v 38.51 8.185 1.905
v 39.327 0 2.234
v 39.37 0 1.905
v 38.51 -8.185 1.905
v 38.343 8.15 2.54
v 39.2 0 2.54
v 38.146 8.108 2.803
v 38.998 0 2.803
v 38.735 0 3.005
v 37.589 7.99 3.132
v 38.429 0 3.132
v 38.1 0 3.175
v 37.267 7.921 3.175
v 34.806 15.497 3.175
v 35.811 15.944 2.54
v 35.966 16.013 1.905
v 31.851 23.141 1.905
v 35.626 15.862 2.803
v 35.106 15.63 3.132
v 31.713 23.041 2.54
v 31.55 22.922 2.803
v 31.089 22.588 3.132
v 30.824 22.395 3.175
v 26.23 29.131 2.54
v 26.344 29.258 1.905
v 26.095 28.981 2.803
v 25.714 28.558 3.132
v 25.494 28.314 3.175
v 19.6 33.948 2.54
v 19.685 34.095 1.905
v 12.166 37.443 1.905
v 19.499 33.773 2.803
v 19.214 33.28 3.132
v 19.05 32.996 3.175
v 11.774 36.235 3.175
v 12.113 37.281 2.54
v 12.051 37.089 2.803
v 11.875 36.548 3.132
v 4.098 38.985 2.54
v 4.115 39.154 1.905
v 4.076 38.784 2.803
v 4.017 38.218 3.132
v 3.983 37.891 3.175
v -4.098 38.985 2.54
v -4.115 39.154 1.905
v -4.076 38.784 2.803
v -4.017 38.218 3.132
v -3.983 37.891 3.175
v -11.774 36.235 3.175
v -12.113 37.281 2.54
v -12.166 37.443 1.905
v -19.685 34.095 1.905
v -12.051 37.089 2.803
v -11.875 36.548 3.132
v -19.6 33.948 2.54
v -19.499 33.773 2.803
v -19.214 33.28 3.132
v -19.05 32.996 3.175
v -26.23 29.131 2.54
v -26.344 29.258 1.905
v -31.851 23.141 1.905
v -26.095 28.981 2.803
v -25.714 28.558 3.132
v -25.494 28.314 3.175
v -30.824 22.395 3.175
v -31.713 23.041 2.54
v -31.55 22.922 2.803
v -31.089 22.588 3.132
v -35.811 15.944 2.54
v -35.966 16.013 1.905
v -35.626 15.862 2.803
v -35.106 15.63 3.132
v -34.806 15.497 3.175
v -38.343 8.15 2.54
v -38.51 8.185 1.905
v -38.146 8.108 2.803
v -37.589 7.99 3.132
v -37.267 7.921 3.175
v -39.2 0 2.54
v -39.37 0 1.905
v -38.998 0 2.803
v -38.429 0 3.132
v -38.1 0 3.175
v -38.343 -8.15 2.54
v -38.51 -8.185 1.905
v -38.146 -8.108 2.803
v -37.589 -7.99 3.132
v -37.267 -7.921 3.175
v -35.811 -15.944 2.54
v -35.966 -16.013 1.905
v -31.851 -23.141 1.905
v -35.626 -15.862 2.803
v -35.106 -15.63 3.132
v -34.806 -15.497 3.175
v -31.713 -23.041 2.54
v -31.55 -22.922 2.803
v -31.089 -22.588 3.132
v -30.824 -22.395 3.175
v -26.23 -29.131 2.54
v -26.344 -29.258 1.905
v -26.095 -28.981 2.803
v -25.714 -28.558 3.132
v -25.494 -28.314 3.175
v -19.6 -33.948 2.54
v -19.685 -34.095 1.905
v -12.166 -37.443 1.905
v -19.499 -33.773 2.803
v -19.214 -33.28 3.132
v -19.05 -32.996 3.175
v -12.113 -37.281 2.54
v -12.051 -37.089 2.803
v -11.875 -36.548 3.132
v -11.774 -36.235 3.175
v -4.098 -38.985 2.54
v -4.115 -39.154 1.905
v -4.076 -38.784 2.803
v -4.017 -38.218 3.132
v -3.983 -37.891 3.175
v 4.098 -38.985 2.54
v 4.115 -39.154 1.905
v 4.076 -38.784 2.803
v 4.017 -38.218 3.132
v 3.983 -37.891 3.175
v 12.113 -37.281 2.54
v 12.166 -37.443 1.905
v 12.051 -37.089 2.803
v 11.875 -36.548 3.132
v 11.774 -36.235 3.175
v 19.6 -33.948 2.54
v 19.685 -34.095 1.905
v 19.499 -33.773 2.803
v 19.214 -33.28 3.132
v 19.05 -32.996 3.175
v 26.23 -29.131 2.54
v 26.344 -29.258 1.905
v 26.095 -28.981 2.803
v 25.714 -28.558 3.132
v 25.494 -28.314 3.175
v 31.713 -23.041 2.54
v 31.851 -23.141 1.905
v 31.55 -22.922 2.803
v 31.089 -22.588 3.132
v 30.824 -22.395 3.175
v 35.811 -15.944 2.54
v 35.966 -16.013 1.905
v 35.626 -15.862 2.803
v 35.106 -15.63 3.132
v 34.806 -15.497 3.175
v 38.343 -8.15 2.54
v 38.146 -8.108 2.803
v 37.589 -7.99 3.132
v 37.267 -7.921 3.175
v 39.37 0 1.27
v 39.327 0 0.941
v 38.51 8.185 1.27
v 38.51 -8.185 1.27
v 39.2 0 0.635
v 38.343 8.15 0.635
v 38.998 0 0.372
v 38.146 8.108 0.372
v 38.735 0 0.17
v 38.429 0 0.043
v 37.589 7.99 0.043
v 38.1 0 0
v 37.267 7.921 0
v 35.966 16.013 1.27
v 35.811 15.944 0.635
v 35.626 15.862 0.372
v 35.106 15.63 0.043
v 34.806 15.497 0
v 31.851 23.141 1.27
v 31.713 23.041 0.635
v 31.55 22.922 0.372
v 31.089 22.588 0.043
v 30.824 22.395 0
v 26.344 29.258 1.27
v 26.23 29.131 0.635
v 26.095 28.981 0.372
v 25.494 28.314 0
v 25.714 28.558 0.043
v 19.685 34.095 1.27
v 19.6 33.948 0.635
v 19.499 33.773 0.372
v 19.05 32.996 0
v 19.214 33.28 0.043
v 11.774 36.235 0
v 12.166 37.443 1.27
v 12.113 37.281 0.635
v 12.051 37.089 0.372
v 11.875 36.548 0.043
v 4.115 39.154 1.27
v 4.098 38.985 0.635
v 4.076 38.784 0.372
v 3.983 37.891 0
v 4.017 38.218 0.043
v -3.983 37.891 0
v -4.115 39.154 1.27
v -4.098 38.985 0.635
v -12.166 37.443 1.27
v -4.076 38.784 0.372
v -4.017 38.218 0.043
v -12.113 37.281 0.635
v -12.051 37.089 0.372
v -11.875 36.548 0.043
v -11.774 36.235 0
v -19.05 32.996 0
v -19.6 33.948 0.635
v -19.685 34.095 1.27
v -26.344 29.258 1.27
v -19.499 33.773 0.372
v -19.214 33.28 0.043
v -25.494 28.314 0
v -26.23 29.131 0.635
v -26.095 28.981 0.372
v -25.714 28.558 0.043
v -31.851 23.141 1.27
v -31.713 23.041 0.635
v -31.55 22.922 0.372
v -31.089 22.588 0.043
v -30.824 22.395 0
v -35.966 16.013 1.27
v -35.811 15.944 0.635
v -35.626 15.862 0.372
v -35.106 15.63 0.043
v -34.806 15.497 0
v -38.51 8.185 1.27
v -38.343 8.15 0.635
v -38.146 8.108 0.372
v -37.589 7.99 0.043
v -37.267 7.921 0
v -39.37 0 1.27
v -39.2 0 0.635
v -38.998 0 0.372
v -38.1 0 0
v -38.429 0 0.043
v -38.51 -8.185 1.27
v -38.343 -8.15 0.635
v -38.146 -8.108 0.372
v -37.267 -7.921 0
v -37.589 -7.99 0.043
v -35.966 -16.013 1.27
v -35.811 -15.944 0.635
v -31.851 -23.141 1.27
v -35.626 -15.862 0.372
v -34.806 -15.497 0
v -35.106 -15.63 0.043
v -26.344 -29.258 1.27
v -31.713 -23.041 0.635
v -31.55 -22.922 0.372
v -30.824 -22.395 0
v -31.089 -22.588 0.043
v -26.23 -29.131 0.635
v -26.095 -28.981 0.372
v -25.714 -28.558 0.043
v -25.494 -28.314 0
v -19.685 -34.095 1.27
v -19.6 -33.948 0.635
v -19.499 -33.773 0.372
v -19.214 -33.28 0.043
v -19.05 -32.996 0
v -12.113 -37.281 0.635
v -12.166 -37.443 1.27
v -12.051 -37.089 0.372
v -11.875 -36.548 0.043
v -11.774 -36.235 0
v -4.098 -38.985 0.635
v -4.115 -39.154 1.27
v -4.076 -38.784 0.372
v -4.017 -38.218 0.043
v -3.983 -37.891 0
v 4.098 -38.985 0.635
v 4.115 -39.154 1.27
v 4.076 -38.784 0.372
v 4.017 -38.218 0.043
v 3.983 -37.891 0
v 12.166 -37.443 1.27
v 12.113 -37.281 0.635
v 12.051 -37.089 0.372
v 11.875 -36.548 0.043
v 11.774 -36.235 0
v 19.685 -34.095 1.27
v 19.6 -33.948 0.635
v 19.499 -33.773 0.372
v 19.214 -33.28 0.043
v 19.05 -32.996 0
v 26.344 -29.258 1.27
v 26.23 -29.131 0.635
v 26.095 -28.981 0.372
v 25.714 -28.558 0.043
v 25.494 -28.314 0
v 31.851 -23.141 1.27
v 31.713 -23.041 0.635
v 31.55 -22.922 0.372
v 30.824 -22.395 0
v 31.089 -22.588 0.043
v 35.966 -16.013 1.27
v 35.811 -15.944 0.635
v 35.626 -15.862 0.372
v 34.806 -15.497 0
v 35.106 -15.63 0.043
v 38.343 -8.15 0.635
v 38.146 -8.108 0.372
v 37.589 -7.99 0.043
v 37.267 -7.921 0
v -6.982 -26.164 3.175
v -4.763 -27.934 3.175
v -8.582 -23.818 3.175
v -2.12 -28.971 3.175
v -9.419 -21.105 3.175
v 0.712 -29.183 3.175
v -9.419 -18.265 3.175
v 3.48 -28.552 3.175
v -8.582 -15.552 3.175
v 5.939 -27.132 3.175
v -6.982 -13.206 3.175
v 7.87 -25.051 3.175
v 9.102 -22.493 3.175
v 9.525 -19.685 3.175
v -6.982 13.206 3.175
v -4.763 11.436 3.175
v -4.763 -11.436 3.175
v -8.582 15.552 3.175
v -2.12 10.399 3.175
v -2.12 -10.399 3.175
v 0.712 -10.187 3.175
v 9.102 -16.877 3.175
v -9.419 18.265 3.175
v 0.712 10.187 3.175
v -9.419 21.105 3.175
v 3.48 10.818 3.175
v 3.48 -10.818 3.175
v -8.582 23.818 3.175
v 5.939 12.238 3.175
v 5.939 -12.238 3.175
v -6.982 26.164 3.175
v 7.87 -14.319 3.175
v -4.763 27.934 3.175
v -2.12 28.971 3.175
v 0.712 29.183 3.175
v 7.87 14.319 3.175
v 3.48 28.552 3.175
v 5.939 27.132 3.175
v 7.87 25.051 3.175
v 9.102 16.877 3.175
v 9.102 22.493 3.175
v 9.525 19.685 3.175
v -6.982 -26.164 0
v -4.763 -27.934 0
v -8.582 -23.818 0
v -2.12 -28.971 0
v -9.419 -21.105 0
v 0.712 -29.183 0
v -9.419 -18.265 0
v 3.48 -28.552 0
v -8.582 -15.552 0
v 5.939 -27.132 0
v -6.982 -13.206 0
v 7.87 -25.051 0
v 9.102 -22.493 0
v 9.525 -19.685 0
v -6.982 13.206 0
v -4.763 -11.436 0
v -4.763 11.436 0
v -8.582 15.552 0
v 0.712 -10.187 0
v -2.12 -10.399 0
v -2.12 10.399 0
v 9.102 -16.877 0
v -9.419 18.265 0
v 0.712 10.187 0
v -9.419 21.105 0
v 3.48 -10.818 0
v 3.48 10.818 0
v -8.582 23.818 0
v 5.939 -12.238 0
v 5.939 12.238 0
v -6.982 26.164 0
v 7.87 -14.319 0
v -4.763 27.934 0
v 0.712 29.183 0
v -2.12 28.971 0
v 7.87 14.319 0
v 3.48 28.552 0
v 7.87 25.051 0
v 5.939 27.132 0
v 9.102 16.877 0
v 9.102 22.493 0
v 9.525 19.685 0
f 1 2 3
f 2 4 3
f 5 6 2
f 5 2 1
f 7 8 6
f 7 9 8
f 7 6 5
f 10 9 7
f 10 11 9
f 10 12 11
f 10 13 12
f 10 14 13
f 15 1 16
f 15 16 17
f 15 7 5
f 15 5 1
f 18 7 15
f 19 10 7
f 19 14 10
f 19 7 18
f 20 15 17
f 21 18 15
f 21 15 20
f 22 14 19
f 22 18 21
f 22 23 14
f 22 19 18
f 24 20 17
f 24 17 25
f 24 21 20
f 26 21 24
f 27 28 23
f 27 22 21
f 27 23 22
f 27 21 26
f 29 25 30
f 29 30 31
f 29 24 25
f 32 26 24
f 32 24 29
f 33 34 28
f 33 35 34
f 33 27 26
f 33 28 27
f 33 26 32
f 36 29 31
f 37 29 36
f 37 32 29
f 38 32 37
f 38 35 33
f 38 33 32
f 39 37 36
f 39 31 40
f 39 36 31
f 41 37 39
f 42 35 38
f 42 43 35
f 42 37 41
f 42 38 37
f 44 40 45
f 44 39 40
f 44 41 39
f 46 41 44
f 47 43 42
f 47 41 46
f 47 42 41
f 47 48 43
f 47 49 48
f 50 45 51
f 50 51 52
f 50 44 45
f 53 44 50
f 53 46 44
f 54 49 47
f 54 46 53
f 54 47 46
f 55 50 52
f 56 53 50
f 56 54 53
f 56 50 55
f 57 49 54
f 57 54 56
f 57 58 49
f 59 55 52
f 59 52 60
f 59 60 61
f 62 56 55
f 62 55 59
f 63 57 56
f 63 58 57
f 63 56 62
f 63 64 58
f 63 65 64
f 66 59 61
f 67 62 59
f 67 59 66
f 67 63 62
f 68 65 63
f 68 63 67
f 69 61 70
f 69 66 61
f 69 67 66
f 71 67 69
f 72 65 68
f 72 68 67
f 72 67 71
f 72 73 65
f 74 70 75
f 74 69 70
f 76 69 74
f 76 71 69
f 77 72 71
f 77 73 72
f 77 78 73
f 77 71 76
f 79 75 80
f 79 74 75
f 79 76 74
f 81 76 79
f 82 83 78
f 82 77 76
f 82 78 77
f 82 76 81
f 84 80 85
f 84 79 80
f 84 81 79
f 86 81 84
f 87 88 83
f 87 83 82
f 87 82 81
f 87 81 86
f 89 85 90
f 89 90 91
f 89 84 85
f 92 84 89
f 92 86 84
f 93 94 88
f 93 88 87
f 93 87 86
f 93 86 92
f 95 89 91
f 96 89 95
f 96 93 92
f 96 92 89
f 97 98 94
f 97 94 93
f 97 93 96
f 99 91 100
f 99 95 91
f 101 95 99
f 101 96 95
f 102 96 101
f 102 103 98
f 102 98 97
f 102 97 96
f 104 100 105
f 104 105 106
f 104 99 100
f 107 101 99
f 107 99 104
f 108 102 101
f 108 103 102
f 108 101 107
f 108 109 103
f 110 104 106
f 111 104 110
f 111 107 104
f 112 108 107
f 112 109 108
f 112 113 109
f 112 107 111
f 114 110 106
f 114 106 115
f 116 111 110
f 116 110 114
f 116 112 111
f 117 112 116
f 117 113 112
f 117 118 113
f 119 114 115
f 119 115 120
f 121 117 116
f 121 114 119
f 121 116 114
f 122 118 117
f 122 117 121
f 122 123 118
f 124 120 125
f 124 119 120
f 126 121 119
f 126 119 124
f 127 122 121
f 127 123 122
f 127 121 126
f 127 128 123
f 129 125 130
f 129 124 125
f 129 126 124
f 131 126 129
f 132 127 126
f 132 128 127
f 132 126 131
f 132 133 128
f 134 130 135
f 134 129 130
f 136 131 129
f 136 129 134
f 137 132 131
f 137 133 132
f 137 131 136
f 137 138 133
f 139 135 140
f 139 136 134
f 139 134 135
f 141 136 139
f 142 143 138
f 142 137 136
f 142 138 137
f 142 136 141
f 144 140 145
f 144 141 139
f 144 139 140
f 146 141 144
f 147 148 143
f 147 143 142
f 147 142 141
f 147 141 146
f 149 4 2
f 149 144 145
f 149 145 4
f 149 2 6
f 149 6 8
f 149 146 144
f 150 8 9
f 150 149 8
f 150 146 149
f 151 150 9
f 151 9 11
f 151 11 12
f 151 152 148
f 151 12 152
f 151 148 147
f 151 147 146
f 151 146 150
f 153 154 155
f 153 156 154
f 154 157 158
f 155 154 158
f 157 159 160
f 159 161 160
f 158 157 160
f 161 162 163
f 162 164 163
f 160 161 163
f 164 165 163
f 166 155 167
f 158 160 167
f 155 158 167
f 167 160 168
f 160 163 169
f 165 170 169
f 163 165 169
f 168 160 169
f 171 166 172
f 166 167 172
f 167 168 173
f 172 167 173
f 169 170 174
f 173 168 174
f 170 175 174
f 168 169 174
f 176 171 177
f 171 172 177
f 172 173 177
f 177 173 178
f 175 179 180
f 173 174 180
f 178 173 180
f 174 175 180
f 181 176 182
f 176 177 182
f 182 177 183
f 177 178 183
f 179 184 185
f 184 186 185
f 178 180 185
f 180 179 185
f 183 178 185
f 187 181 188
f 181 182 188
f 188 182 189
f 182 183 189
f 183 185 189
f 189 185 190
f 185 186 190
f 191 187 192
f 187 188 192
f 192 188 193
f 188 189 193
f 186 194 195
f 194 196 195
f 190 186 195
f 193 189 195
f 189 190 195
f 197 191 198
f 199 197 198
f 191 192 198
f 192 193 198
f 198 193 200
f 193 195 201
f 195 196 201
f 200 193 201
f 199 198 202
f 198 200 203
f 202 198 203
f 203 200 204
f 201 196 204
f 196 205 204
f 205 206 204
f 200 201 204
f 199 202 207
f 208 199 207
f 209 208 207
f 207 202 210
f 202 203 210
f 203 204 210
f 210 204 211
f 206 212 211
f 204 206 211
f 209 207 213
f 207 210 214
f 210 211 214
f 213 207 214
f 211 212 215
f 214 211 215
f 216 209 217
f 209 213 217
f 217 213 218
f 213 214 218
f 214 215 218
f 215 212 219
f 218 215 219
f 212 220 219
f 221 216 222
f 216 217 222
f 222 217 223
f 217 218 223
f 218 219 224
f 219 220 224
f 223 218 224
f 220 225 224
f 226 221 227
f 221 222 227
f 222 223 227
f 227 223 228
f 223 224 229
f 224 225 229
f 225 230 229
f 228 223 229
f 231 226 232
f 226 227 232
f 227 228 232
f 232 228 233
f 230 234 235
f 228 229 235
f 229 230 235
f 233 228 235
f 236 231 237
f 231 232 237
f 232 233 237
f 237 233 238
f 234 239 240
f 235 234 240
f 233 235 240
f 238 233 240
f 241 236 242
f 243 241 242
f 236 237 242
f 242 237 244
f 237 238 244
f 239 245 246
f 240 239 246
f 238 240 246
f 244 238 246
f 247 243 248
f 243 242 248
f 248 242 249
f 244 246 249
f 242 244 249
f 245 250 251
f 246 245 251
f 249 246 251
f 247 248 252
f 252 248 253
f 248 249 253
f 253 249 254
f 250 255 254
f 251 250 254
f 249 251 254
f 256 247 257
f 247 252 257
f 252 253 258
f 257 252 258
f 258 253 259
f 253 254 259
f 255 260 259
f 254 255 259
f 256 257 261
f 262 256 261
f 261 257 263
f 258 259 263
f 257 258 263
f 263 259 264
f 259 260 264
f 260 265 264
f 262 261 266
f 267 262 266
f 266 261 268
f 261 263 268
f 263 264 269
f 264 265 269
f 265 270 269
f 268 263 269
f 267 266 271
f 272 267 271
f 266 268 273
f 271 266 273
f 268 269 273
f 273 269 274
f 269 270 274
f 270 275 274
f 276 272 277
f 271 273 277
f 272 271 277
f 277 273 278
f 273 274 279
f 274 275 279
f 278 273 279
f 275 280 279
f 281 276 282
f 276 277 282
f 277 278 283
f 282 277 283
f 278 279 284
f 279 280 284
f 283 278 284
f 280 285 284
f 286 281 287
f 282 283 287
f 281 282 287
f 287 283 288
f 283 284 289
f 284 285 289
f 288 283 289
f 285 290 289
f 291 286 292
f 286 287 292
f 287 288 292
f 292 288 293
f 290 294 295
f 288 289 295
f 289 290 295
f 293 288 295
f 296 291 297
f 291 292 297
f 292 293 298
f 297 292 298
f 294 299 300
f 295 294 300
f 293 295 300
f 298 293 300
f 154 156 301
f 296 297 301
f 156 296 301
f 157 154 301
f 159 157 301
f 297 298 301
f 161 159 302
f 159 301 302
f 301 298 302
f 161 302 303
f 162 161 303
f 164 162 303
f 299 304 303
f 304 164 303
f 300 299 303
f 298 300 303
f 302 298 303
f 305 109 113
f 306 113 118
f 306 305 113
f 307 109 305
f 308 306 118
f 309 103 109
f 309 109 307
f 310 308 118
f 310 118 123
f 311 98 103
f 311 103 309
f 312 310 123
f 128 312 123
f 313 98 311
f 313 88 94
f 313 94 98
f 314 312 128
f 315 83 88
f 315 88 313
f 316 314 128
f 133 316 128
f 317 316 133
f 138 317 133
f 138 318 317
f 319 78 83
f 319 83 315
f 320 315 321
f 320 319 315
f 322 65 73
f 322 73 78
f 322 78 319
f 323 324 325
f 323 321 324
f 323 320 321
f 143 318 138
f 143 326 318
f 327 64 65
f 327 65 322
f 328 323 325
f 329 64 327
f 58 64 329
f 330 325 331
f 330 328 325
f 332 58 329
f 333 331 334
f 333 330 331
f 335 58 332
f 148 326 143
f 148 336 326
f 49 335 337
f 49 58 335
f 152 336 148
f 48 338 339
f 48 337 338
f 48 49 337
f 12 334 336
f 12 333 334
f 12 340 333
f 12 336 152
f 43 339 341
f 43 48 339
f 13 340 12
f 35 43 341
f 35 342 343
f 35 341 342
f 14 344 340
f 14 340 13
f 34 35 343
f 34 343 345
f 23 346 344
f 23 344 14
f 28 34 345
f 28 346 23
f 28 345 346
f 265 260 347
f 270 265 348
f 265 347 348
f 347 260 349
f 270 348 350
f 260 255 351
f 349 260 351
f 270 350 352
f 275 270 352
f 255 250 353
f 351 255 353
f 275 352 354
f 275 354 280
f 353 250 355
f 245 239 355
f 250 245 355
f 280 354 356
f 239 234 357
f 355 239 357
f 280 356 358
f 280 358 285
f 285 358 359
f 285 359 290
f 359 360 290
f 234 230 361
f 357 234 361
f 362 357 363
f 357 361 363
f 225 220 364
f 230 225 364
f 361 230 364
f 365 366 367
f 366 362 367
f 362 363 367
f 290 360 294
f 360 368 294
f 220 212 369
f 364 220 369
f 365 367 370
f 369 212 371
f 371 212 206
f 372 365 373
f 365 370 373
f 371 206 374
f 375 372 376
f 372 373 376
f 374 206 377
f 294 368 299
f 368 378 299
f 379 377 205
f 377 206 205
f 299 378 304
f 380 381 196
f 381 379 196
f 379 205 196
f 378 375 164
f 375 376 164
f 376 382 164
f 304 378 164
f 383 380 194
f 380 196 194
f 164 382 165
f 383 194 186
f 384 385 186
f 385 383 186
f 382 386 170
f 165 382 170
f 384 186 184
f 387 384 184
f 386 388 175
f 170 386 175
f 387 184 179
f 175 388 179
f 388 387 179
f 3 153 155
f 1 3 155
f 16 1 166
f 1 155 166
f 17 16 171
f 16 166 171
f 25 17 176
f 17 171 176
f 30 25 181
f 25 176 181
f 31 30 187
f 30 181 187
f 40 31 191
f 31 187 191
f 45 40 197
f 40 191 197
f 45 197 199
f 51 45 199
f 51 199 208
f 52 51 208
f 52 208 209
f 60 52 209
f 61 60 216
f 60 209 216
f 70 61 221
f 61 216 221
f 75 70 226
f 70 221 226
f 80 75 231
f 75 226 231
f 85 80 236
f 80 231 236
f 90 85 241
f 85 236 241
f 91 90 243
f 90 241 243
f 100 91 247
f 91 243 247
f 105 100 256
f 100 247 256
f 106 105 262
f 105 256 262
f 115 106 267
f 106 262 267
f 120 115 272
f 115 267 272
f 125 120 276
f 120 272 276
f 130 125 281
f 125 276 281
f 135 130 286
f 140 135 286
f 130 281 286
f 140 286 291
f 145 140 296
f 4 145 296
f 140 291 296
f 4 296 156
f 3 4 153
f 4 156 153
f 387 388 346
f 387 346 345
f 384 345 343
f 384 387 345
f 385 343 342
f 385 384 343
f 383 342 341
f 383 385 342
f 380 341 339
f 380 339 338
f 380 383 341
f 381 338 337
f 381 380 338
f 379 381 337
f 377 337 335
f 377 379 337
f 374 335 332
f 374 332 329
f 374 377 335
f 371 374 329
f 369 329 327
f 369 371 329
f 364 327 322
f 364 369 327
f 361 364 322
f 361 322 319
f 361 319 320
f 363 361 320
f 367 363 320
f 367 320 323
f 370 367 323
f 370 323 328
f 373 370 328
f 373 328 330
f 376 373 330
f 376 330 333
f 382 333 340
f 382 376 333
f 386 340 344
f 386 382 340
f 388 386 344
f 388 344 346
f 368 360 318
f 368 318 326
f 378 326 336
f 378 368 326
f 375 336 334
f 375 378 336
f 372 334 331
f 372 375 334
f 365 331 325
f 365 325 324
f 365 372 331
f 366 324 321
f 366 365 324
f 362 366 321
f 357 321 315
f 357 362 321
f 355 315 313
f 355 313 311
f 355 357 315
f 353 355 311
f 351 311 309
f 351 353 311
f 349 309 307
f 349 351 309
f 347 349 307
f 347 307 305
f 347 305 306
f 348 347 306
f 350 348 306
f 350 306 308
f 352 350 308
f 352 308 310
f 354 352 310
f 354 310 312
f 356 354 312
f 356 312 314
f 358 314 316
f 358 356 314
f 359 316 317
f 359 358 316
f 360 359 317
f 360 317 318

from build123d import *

# Parameters (mm, degrees)
SKETCH2_R           = 39.37
SKETCH2_R_2         = 9.525
BOSS_EXTRUDE2_DEPTH = 3.175
FILLET1_R           = 1.27


with BuildPart() as part:
    # Sketch2 → Boss-Extrude2 (new body)
    with BuildSketch(Plane.XY):
        Circle(SKETCH2_R)
        with Locations((0, 19.685)):
            Circle(SKETCH2_R_2, mode=Mode.SUBTRACT)
        with Locations((0, -19.685)):
            Circle(SKETCH2_R_2, mode=Mode.SUBTRACT)
    extrude(amount=BOSS_EXTRUDE2_DEPTH)

    # Fillet1
    fillet1_edges = [part.edges().sort_by_distance(p)[0] for p in [
        (-39.37, 0, 0),
        (-39.37, 0, 3.175),
    ]]
    fillet(fillet1_edges, radius=FILLET1_R)


solid = part.part
